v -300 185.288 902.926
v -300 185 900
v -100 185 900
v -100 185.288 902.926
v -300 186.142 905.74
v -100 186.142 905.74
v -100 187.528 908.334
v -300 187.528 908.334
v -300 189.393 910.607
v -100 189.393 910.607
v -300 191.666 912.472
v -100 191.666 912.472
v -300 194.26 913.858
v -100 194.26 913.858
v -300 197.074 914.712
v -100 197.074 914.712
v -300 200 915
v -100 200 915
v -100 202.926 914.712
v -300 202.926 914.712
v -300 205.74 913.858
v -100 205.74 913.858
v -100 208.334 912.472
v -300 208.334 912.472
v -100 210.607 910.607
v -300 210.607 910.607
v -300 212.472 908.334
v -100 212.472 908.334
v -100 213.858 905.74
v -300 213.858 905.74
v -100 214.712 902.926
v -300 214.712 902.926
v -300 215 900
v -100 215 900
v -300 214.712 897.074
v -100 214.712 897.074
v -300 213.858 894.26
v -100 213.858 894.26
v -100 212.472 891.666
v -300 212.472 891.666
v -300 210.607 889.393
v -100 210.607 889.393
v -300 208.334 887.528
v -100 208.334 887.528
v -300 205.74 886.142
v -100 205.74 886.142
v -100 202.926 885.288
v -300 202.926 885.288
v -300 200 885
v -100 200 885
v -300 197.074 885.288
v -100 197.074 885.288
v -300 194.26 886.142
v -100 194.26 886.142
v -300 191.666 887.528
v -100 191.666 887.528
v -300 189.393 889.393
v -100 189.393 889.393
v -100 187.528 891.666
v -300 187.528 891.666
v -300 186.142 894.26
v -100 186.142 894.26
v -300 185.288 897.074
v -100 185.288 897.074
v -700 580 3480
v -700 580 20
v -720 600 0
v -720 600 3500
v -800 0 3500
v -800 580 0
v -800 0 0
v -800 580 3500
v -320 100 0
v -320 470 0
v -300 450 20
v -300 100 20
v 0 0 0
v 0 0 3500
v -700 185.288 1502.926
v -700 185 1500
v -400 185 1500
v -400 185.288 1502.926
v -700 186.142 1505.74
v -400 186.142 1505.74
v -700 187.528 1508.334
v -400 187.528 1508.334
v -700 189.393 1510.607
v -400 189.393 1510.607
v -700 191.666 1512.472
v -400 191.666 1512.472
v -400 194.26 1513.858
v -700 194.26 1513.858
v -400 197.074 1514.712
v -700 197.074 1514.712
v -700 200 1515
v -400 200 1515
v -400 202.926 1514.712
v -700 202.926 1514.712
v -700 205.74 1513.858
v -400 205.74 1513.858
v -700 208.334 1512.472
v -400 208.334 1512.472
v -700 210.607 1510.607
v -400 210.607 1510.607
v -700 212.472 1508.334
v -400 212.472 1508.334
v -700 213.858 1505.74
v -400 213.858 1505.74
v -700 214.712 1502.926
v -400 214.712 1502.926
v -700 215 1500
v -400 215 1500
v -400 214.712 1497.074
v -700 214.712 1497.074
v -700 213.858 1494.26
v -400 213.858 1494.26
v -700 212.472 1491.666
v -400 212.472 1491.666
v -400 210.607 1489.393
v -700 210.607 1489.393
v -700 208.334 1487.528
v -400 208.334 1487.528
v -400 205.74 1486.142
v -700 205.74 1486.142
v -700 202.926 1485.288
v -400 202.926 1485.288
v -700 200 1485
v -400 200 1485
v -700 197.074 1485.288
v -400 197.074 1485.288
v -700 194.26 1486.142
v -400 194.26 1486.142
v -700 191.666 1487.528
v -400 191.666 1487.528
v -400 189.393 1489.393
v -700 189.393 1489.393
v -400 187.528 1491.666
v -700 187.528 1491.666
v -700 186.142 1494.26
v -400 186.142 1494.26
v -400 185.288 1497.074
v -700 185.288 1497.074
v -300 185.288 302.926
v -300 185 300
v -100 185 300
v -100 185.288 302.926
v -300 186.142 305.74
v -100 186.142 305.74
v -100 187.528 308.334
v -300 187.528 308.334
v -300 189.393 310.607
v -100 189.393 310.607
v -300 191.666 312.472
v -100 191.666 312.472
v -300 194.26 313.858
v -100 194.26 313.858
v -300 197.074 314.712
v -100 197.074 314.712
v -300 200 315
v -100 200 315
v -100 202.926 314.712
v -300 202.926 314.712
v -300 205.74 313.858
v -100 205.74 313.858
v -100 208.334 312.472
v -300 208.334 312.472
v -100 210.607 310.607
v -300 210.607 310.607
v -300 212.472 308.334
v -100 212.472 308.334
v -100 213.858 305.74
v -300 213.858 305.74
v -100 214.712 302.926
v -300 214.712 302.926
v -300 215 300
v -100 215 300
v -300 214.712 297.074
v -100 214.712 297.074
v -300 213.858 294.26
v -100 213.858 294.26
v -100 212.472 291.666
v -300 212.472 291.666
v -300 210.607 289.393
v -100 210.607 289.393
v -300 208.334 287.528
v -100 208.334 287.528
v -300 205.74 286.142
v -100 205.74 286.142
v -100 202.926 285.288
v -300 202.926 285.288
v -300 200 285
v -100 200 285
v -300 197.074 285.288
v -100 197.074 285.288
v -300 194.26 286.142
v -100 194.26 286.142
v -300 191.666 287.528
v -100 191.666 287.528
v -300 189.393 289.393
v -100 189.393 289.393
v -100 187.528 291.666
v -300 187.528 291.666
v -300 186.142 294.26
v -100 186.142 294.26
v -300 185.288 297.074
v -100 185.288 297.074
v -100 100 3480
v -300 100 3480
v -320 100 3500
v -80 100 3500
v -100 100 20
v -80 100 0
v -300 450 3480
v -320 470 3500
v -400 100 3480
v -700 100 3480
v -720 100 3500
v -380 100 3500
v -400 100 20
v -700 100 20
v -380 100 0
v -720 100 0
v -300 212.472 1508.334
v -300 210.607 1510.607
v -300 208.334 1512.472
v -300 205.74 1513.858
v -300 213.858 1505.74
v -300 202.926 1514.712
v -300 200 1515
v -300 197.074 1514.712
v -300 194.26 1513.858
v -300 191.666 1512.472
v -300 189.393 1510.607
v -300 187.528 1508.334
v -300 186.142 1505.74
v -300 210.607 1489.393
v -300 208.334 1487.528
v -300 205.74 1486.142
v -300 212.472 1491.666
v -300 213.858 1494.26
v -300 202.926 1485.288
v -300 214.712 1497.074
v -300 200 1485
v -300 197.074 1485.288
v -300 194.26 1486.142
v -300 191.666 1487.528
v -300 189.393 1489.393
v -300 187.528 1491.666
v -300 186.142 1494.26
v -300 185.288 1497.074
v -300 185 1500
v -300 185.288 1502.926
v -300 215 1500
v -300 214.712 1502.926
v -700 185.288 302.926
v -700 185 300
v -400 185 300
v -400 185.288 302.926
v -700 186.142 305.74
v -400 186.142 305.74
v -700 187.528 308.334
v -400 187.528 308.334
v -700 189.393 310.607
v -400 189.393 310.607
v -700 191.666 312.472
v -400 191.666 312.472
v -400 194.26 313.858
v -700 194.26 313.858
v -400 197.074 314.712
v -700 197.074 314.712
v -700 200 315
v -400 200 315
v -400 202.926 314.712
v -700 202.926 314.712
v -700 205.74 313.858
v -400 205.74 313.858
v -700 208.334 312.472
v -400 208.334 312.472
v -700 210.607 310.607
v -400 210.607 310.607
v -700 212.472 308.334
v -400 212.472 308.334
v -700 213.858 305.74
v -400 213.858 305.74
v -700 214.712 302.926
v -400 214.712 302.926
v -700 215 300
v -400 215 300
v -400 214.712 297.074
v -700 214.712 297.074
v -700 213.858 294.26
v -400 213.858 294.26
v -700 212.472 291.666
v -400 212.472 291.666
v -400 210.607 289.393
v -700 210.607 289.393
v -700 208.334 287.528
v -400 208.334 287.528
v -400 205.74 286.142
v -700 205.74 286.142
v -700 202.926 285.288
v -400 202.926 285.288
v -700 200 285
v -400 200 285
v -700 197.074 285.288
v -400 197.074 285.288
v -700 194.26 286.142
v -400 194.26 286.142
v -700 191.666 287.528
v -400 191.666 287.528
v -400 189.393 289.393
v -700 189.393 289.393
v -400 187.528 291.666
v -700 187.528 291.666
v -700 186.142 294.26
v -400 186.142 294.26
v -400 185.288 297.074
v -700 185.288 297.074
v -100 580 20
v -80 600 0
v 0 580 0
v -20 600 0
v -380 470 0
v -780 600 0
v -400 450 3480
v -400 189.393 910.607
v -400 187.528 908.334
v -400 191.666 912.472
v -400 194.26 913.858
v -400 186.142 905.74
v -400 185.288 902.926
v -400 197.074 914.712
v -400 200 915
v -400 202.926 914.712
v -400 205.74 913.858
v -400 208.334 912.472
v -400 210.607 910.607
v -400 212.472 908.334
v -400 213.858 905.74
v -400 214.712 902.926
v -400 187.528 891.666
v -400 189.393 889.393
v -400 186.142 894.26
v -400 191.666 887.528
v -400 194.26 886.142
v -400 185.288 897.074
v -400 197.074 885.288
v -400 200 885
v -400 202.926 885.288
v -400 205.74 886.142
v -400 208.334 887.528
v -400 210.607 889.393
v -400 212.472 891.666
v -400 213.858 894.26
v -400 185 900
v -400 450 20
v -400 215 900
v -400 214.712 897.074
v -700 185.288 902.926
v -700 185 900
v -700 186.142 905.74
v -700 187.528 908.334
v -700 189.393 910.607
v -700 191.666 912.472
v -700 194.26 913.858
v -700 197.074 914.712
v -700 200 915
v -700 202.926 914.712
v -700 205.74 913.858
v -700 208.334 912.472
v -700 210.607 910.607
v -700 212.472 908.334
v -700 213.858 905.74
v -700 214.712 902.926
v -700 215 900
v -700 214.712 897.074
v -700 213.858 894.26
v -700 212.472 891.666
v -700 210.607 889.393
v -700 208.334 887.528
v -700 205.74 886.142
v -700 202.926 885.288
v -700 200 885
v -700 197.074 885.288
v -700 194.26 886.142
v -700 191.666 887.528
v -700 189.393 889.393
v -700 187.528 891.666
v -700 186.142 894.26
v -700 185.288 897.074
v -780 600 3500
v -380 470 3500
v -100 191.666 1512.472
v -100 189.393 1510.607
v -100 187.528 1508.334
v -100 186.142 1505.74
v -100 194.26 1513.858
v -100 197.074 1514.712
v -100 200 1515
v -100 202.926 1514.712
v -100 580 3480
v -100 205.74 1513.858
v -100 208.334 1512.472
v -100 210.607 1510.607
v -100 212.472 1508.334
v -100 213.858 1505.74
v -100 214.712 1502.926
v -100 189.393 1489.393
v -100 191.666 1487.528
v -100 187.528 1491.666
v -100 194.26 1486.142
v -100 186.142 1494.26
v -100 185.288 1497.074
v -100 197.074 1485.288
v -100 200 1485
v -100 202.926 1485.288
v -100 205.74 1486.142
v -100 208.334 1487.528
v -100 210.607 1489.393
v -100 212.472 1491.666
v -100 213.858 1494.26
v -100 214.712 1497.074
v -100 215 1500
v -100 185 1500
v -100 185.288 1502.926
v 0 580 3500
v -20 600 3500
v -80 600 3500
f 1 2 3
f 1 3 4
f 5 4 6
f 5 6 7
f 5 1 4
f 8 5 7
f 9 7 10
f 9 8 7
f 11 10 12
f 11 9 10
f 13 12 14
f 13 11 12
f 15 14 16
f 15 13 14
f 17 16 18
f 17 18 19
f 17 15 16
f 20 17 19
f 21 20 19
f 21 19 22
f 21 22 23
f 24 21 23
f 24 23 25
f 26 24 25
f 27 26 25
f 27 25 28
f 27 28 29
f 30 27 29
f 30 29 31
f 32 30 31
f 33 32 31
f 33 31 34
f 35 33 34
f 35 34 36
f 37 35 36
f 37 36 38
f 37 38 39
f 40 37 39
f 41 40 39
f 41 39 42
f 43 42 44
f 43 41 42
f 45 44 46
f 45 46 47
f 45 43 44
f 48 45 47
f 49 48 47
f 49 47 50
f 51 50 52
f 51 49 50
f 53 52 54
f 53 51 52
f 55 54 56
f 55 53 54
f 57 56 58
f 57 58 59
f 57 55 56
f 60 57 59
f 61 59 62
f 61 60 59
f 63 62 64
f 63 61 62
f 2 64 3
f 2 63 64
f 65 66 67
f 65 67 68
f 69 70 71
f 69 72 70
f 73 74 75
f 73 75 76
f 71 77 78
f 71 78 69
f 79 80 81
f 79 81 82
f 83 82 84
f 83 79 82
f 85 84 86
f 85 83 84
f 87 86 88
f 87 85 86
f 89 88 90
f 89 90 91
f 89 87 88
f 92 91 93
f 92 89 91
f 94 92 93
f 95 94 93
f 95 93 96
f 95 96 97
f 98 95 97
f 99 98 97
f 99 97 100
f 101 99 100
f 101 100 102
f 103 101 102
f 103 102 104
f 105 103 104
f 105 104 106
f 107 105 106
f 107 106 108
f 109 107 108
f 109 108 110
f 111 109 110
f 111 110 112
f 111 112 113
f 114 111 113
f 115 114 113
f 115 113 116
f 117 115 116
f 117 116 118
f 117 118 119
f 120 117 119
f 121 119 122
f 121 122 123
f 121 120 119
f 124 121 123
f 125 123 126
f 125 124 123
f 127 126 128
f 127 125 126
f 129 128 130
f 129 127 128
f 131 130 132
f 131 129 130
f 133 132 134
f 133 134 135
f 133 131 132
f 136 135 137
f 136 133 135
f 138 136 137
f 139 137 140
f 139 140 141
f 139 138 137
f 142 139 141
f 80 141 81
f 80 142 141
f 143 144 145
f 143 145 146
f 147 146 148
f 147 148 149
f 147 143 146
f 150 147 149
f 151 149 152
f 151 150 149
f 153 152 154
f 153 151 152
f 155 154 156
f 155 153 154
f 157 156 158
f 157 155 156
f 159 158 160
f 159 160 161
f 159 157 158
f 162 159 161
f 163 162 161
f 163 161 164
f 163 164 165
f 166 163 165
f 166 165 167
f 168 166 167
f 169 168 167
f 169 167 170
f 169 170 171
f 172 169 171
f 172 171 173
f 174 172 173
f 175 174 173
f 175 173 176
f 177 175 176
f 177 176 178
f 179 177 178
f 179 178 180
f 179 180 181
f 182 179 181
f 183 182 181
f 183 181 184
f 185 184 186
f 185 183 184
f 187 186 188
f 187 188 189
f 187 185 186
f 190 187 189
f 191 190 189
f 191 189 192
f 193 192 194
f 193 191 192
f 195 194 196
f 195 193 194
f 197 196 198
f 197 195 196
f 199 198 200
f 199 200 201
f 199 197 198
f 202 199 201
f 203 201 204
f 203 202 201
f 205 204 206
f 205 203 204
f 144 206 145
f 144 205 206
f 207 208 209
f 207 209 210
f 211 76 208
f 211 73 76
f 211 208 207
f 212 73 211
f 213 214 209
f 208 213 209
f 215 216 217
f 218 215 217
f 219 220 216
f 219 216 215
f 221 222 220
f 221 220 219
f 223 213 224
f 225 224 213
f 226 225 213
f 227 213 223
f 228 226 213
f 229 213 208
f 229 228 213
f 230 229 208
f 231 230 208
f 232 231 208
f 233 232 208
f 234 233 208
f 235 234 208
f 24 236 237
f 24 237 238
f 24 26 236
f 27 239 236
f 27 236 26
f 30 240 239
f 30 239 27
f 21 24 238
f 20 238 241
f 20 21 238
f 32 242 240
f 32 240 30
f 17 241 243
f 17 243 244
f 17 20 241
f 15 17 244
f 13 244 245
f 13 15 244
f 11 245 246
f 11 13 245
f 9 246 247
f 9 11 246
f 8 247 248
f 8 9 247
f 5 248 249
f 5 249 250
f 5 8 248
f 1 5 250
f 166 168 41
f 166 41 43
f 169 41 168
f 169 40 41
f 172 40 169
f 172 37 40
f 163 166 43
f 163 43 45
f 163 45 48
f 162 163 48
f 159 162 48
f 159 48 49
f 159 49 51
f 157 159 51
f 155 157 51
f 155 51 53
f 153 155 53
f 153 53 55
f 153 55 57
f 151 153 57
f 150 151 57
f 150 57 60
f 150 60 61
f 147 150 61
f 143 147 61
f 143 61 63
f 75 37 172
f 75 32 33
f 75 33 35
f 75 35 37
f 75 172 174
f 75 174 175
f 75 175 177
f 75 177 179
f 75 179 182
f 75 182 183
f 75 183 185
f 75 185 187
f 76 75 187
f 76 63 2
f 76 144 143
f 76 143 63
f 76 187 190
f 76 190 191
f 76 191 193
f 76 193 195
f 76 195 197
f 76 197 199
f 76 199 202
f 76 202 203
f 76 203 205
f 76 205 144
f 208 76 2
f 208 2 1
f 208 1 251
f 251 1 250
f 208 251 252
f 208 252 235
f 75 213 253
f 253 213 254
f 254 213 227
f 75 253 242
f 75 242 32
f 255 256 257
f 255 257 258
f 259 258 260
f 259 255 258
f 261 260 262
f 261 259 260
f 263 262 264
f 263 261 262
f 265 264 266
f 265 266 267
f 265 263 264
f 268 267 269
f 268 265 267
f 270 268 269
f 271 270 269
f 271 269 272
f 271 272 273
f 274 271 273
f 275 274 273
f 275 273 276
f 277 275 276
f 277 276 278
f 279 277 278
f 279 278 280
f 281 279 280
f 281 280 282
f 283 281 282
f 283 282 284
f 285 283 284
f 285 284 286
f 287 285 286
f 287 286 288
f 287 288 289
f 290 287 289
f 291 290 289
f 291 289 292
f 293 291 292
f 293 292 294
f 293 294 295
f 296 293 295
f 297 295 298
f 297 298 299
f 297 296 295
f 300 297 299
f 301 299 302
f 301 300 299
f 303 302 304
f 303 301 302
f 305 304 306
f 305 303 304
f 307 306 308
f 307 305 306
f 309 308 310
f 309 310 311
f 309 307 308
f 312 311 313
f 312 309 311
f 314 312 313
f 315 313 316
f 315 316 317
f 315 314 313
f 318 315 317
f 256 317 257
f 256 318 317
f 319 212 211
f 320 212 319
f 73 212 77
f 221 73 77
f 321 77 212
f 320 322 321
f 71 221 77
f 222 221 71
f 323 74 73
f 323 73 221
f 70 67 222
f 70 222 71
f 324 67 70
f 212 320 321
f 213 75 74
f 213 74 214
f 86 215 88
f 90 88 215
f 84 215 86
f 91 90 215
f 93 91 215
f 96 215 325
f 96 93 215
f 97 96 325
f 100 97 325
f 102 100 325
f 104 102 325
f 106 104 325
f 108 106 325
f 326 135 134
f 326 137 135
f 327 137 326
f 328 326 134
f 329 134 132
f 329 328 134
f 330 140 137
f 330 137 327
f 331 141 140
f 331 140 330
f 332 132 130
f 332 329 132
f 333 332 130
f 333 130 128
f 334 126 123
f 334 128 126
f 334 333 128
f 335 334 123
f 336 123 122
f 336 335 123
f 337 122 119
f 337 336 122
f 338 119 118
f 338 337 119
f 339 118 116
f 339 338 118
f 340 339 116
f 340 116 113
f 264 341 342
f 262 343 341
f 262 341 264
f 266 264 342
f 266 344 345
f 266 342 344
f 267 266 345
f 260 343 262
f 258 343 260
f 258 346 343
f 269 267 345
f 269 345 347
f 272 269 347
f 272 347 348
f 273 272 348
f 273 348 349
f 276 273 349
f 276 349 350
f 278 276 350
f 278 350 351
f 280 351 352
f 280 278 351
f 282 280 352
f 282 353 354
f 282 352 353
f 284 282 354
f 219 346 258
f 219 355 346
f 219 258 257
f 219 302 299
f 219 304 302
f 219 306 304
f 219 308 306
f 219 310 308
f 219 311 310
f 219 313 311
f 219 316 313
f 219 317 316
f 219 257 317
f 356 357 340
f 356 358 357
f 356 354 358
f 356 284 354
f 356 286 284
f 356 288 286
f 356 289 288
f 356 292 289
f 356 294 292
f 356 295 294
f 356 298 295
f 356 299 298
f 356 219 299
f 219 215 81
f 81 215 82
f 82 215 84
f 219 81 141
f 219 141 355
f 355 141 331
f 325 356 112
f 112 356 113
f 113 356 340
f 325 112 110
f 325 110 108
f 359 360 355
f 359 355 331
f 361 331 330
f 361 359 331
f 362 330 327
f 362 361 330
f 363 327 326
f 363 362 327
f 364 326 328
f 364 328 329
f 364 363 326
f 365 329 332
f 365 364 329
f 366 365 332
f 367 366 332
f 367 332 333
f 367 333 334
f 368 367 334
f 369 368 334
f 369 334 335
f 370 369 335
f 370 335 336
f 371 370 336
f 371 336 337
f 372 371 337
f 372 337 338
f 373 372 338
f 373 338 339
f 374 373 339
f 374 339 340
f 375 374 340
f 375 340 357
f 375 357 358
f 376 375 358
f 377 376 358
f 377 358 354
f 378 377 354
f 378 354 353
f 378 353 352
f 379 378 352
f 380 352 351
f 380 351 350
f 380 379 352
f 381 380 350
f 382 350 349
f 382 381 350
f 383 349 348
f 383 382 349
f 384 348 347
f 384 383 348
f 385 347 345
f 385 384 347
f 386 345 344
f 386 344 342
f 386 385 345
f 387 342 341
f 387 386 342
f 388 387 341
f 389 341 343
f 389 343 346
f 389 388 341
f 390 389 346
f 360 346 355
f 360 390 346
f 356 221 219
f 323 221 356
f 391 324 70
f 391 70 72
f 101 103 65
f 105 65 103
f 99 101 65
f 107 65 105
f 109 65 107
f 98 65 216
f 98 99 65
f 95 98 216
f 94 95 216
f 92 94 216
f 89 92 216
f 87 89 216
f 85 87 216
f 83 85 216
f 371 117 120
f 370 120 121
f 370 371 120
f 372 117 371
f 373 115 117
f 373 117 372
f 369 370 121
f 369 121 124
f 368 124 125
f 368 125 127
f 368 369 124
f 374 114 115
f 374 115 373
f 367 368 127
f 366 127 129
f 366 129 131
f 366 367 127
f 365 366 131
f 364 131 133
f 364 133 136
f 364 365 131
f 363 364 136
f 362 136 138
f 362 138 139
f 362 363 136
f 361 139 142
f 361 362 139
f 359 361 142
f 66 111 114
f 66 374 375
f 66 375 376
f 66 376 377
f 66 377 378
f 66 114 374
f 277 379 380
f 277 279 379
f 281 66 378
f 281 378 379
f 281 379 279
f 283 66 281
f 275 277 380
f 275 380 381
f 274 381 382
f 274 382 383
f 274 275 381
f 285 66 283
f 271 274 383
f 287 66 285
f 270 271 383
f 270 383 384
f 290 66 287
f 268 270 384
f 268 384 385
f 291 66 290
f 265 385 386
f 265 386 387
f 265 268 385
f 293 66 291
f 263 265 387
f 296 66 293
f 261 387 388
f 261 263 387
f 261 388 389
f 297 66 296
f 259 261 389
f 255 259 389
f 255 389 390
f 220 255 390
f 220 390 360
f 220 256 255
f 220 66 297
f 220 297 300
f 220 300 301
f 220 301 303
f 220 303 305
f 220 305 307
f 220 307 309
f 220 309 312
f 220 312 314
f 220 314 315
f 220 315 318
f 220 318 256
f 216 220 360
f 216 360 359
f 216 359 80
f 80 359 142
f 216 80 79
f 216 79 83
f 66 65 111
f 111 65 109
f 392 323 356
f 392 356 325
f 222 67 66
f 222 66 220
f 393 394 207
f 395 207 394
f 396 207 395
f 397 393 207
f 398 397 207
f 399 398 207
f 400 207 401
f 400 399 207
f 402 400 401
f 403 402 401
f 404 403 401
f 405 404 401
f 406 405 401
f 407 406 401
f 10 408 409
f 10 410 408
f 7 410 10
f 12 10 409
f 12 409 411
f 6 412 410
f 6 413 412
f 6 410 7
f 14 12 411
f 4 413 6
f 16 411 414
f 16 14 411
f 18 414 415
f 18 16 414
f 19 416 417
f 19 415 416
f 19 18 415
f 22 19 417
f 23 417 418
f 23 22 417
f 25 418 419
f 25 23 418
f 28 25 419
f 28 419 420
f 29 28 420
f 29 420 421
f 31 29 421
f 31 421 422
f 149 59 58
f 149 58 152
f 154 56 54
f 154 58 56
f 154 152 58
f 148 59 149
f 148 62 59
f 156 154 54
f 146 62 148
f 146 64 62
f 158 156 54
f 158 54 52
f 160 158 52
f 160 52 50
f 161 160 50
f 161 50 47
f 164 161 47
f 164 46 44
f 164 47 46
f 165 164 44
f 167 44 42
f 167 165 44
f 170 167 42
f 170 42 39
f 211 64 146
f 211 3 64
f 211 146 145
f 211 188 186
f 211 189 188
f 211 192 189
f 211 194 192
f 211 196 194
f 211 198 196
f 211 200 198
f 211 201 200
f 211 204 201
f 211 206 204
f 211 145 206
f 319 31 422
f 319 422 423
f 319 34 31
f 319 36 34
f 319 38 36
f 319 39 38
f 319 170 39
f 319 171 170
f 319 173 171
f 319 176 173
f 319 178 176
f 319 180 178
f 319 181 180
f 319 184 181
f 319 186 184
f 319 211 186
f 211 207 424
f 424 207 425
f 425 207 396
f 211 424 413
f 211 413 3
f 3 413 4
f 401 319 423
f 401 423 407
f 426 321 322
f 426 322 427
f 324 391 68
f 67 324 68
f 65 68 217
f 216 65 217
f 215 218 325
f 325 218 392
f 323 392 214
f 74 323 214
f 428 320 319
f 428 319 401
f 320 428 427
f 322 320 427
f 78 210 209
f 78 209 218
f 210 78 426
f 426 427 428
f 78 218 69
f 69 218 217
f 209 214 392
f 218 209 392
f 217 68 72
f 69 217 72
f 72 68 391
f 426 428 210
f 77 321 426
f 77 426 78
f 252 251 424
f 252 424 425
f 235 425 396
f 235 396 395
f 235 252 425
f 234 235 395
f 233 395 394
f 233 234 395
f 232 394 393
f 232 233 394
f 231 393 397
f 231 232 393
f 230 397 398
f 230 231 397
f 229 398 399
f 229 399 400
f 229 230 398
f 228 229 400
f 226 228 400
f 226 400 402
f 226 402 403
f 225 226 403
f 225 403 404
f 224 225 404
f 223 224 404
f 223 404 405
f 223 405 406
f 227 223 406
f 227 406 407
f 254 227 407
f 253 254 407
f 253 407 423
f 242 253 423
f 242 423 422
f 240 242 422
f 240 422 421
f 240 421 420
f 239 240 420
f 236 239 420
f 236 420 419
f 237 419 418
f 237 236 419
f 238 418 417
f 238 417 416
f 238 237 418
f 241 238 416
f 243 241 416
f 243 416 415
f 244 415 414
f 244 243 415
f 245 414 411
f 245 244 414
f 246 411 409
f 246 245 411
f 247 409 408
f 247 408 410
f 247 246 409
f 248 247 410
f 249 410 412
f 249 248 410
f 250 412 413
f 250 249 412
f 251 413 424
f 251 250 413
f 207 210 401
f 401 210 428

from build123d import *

# Parameters (mm, degrees)
SALIENTE_EXTRUIR1_DEPTH = 3500
CHAFL_N2_SIZE           = 20
SALIENTE_EXTRUIR2_REACH = 3642.055
CROQUIS2_R              = 15
MATRIZL1_COUNT          = 3
MATRIZL1_PITCH          = 600


with BuildPart() as part:
    # Croquis1 → Saliente-Extruir1 (new body)
    with BuildSketch(Plane.XY):
        Polygon((0, 0), (-800, 0), (-800, 600), (-700, 600), (-700, 100), (-400, 100), (-400, 470), (-300, 470), (-300, 100), (-100, 100), (-100, 600), (0, 600), align=None)
    extrude(amount=SALIENTE_EXTRUIR1_DEPTH)

    # Chaflán2
    chafl_n2_edges = [part.edges().sort_by_distance(p)[0] for p in [
        (-100, 350, 3500),
        (-700, 350, 0),
        (-400, 285, 0),
        (-300, 285, 0),
        (-100, 350, 0),
        (-300, 285, 3500),
        (-800, 600, 1750),
        (-700, 600, 1750),
        (-400, 470, 1750),
        (-300, 470, 1750),
        (-100, 600, 1750),
        (0, 600, 1750),
        (-400, 285, 3500),
        (-700, 350, 3500),
    ]]
    chamfer(chafl_n2_edges, length=CHAFL_N2_SIZE)

    # Saliente-Extruir2: up to this face of the body (flat: up to its plane)
    saliente_extruir2_end = Plane(part.part.faces().sort_by_distance((-100, 340, 1750))[0])
    # Croquis2 → Saliente-Extruir2 (add, up to the picked face)
    with BuildSketch(Plane.ZY.offset(800), mode=Mode.PRIVATE) as saliente_extruir2_sk1:
        with Locations(Location((300, 200, 0), (0, 0, 270))):
            Circle(CROQUIS2_R)
    saliente_extruir2_tool1 = split(extrude(saliente_extruir2_sk1.sketch, amount=-SALIENTE_EXTRUIR2_REACH, mode=Mode.PRIVATE), bisect_by=saliente_extruir2_end, keep=Keep.BOTH, mode=Mode.PRIVATE)
    saliente_extruir2 = saliente_extruir2_tool1.solids().sort_by(Axis((-800, 200, 300), (1, 0, 0)))[0]
    add(saliente_extruir2)

    # MatrizL1: Saliente-Extruir2 ×3
    with Locations(*[(0, 0, i * MATRIZL1_PITCH) for i in range(1, MATRIZL1_COUNT)]):
        add(saliente_extruir2)


solid = part.part
